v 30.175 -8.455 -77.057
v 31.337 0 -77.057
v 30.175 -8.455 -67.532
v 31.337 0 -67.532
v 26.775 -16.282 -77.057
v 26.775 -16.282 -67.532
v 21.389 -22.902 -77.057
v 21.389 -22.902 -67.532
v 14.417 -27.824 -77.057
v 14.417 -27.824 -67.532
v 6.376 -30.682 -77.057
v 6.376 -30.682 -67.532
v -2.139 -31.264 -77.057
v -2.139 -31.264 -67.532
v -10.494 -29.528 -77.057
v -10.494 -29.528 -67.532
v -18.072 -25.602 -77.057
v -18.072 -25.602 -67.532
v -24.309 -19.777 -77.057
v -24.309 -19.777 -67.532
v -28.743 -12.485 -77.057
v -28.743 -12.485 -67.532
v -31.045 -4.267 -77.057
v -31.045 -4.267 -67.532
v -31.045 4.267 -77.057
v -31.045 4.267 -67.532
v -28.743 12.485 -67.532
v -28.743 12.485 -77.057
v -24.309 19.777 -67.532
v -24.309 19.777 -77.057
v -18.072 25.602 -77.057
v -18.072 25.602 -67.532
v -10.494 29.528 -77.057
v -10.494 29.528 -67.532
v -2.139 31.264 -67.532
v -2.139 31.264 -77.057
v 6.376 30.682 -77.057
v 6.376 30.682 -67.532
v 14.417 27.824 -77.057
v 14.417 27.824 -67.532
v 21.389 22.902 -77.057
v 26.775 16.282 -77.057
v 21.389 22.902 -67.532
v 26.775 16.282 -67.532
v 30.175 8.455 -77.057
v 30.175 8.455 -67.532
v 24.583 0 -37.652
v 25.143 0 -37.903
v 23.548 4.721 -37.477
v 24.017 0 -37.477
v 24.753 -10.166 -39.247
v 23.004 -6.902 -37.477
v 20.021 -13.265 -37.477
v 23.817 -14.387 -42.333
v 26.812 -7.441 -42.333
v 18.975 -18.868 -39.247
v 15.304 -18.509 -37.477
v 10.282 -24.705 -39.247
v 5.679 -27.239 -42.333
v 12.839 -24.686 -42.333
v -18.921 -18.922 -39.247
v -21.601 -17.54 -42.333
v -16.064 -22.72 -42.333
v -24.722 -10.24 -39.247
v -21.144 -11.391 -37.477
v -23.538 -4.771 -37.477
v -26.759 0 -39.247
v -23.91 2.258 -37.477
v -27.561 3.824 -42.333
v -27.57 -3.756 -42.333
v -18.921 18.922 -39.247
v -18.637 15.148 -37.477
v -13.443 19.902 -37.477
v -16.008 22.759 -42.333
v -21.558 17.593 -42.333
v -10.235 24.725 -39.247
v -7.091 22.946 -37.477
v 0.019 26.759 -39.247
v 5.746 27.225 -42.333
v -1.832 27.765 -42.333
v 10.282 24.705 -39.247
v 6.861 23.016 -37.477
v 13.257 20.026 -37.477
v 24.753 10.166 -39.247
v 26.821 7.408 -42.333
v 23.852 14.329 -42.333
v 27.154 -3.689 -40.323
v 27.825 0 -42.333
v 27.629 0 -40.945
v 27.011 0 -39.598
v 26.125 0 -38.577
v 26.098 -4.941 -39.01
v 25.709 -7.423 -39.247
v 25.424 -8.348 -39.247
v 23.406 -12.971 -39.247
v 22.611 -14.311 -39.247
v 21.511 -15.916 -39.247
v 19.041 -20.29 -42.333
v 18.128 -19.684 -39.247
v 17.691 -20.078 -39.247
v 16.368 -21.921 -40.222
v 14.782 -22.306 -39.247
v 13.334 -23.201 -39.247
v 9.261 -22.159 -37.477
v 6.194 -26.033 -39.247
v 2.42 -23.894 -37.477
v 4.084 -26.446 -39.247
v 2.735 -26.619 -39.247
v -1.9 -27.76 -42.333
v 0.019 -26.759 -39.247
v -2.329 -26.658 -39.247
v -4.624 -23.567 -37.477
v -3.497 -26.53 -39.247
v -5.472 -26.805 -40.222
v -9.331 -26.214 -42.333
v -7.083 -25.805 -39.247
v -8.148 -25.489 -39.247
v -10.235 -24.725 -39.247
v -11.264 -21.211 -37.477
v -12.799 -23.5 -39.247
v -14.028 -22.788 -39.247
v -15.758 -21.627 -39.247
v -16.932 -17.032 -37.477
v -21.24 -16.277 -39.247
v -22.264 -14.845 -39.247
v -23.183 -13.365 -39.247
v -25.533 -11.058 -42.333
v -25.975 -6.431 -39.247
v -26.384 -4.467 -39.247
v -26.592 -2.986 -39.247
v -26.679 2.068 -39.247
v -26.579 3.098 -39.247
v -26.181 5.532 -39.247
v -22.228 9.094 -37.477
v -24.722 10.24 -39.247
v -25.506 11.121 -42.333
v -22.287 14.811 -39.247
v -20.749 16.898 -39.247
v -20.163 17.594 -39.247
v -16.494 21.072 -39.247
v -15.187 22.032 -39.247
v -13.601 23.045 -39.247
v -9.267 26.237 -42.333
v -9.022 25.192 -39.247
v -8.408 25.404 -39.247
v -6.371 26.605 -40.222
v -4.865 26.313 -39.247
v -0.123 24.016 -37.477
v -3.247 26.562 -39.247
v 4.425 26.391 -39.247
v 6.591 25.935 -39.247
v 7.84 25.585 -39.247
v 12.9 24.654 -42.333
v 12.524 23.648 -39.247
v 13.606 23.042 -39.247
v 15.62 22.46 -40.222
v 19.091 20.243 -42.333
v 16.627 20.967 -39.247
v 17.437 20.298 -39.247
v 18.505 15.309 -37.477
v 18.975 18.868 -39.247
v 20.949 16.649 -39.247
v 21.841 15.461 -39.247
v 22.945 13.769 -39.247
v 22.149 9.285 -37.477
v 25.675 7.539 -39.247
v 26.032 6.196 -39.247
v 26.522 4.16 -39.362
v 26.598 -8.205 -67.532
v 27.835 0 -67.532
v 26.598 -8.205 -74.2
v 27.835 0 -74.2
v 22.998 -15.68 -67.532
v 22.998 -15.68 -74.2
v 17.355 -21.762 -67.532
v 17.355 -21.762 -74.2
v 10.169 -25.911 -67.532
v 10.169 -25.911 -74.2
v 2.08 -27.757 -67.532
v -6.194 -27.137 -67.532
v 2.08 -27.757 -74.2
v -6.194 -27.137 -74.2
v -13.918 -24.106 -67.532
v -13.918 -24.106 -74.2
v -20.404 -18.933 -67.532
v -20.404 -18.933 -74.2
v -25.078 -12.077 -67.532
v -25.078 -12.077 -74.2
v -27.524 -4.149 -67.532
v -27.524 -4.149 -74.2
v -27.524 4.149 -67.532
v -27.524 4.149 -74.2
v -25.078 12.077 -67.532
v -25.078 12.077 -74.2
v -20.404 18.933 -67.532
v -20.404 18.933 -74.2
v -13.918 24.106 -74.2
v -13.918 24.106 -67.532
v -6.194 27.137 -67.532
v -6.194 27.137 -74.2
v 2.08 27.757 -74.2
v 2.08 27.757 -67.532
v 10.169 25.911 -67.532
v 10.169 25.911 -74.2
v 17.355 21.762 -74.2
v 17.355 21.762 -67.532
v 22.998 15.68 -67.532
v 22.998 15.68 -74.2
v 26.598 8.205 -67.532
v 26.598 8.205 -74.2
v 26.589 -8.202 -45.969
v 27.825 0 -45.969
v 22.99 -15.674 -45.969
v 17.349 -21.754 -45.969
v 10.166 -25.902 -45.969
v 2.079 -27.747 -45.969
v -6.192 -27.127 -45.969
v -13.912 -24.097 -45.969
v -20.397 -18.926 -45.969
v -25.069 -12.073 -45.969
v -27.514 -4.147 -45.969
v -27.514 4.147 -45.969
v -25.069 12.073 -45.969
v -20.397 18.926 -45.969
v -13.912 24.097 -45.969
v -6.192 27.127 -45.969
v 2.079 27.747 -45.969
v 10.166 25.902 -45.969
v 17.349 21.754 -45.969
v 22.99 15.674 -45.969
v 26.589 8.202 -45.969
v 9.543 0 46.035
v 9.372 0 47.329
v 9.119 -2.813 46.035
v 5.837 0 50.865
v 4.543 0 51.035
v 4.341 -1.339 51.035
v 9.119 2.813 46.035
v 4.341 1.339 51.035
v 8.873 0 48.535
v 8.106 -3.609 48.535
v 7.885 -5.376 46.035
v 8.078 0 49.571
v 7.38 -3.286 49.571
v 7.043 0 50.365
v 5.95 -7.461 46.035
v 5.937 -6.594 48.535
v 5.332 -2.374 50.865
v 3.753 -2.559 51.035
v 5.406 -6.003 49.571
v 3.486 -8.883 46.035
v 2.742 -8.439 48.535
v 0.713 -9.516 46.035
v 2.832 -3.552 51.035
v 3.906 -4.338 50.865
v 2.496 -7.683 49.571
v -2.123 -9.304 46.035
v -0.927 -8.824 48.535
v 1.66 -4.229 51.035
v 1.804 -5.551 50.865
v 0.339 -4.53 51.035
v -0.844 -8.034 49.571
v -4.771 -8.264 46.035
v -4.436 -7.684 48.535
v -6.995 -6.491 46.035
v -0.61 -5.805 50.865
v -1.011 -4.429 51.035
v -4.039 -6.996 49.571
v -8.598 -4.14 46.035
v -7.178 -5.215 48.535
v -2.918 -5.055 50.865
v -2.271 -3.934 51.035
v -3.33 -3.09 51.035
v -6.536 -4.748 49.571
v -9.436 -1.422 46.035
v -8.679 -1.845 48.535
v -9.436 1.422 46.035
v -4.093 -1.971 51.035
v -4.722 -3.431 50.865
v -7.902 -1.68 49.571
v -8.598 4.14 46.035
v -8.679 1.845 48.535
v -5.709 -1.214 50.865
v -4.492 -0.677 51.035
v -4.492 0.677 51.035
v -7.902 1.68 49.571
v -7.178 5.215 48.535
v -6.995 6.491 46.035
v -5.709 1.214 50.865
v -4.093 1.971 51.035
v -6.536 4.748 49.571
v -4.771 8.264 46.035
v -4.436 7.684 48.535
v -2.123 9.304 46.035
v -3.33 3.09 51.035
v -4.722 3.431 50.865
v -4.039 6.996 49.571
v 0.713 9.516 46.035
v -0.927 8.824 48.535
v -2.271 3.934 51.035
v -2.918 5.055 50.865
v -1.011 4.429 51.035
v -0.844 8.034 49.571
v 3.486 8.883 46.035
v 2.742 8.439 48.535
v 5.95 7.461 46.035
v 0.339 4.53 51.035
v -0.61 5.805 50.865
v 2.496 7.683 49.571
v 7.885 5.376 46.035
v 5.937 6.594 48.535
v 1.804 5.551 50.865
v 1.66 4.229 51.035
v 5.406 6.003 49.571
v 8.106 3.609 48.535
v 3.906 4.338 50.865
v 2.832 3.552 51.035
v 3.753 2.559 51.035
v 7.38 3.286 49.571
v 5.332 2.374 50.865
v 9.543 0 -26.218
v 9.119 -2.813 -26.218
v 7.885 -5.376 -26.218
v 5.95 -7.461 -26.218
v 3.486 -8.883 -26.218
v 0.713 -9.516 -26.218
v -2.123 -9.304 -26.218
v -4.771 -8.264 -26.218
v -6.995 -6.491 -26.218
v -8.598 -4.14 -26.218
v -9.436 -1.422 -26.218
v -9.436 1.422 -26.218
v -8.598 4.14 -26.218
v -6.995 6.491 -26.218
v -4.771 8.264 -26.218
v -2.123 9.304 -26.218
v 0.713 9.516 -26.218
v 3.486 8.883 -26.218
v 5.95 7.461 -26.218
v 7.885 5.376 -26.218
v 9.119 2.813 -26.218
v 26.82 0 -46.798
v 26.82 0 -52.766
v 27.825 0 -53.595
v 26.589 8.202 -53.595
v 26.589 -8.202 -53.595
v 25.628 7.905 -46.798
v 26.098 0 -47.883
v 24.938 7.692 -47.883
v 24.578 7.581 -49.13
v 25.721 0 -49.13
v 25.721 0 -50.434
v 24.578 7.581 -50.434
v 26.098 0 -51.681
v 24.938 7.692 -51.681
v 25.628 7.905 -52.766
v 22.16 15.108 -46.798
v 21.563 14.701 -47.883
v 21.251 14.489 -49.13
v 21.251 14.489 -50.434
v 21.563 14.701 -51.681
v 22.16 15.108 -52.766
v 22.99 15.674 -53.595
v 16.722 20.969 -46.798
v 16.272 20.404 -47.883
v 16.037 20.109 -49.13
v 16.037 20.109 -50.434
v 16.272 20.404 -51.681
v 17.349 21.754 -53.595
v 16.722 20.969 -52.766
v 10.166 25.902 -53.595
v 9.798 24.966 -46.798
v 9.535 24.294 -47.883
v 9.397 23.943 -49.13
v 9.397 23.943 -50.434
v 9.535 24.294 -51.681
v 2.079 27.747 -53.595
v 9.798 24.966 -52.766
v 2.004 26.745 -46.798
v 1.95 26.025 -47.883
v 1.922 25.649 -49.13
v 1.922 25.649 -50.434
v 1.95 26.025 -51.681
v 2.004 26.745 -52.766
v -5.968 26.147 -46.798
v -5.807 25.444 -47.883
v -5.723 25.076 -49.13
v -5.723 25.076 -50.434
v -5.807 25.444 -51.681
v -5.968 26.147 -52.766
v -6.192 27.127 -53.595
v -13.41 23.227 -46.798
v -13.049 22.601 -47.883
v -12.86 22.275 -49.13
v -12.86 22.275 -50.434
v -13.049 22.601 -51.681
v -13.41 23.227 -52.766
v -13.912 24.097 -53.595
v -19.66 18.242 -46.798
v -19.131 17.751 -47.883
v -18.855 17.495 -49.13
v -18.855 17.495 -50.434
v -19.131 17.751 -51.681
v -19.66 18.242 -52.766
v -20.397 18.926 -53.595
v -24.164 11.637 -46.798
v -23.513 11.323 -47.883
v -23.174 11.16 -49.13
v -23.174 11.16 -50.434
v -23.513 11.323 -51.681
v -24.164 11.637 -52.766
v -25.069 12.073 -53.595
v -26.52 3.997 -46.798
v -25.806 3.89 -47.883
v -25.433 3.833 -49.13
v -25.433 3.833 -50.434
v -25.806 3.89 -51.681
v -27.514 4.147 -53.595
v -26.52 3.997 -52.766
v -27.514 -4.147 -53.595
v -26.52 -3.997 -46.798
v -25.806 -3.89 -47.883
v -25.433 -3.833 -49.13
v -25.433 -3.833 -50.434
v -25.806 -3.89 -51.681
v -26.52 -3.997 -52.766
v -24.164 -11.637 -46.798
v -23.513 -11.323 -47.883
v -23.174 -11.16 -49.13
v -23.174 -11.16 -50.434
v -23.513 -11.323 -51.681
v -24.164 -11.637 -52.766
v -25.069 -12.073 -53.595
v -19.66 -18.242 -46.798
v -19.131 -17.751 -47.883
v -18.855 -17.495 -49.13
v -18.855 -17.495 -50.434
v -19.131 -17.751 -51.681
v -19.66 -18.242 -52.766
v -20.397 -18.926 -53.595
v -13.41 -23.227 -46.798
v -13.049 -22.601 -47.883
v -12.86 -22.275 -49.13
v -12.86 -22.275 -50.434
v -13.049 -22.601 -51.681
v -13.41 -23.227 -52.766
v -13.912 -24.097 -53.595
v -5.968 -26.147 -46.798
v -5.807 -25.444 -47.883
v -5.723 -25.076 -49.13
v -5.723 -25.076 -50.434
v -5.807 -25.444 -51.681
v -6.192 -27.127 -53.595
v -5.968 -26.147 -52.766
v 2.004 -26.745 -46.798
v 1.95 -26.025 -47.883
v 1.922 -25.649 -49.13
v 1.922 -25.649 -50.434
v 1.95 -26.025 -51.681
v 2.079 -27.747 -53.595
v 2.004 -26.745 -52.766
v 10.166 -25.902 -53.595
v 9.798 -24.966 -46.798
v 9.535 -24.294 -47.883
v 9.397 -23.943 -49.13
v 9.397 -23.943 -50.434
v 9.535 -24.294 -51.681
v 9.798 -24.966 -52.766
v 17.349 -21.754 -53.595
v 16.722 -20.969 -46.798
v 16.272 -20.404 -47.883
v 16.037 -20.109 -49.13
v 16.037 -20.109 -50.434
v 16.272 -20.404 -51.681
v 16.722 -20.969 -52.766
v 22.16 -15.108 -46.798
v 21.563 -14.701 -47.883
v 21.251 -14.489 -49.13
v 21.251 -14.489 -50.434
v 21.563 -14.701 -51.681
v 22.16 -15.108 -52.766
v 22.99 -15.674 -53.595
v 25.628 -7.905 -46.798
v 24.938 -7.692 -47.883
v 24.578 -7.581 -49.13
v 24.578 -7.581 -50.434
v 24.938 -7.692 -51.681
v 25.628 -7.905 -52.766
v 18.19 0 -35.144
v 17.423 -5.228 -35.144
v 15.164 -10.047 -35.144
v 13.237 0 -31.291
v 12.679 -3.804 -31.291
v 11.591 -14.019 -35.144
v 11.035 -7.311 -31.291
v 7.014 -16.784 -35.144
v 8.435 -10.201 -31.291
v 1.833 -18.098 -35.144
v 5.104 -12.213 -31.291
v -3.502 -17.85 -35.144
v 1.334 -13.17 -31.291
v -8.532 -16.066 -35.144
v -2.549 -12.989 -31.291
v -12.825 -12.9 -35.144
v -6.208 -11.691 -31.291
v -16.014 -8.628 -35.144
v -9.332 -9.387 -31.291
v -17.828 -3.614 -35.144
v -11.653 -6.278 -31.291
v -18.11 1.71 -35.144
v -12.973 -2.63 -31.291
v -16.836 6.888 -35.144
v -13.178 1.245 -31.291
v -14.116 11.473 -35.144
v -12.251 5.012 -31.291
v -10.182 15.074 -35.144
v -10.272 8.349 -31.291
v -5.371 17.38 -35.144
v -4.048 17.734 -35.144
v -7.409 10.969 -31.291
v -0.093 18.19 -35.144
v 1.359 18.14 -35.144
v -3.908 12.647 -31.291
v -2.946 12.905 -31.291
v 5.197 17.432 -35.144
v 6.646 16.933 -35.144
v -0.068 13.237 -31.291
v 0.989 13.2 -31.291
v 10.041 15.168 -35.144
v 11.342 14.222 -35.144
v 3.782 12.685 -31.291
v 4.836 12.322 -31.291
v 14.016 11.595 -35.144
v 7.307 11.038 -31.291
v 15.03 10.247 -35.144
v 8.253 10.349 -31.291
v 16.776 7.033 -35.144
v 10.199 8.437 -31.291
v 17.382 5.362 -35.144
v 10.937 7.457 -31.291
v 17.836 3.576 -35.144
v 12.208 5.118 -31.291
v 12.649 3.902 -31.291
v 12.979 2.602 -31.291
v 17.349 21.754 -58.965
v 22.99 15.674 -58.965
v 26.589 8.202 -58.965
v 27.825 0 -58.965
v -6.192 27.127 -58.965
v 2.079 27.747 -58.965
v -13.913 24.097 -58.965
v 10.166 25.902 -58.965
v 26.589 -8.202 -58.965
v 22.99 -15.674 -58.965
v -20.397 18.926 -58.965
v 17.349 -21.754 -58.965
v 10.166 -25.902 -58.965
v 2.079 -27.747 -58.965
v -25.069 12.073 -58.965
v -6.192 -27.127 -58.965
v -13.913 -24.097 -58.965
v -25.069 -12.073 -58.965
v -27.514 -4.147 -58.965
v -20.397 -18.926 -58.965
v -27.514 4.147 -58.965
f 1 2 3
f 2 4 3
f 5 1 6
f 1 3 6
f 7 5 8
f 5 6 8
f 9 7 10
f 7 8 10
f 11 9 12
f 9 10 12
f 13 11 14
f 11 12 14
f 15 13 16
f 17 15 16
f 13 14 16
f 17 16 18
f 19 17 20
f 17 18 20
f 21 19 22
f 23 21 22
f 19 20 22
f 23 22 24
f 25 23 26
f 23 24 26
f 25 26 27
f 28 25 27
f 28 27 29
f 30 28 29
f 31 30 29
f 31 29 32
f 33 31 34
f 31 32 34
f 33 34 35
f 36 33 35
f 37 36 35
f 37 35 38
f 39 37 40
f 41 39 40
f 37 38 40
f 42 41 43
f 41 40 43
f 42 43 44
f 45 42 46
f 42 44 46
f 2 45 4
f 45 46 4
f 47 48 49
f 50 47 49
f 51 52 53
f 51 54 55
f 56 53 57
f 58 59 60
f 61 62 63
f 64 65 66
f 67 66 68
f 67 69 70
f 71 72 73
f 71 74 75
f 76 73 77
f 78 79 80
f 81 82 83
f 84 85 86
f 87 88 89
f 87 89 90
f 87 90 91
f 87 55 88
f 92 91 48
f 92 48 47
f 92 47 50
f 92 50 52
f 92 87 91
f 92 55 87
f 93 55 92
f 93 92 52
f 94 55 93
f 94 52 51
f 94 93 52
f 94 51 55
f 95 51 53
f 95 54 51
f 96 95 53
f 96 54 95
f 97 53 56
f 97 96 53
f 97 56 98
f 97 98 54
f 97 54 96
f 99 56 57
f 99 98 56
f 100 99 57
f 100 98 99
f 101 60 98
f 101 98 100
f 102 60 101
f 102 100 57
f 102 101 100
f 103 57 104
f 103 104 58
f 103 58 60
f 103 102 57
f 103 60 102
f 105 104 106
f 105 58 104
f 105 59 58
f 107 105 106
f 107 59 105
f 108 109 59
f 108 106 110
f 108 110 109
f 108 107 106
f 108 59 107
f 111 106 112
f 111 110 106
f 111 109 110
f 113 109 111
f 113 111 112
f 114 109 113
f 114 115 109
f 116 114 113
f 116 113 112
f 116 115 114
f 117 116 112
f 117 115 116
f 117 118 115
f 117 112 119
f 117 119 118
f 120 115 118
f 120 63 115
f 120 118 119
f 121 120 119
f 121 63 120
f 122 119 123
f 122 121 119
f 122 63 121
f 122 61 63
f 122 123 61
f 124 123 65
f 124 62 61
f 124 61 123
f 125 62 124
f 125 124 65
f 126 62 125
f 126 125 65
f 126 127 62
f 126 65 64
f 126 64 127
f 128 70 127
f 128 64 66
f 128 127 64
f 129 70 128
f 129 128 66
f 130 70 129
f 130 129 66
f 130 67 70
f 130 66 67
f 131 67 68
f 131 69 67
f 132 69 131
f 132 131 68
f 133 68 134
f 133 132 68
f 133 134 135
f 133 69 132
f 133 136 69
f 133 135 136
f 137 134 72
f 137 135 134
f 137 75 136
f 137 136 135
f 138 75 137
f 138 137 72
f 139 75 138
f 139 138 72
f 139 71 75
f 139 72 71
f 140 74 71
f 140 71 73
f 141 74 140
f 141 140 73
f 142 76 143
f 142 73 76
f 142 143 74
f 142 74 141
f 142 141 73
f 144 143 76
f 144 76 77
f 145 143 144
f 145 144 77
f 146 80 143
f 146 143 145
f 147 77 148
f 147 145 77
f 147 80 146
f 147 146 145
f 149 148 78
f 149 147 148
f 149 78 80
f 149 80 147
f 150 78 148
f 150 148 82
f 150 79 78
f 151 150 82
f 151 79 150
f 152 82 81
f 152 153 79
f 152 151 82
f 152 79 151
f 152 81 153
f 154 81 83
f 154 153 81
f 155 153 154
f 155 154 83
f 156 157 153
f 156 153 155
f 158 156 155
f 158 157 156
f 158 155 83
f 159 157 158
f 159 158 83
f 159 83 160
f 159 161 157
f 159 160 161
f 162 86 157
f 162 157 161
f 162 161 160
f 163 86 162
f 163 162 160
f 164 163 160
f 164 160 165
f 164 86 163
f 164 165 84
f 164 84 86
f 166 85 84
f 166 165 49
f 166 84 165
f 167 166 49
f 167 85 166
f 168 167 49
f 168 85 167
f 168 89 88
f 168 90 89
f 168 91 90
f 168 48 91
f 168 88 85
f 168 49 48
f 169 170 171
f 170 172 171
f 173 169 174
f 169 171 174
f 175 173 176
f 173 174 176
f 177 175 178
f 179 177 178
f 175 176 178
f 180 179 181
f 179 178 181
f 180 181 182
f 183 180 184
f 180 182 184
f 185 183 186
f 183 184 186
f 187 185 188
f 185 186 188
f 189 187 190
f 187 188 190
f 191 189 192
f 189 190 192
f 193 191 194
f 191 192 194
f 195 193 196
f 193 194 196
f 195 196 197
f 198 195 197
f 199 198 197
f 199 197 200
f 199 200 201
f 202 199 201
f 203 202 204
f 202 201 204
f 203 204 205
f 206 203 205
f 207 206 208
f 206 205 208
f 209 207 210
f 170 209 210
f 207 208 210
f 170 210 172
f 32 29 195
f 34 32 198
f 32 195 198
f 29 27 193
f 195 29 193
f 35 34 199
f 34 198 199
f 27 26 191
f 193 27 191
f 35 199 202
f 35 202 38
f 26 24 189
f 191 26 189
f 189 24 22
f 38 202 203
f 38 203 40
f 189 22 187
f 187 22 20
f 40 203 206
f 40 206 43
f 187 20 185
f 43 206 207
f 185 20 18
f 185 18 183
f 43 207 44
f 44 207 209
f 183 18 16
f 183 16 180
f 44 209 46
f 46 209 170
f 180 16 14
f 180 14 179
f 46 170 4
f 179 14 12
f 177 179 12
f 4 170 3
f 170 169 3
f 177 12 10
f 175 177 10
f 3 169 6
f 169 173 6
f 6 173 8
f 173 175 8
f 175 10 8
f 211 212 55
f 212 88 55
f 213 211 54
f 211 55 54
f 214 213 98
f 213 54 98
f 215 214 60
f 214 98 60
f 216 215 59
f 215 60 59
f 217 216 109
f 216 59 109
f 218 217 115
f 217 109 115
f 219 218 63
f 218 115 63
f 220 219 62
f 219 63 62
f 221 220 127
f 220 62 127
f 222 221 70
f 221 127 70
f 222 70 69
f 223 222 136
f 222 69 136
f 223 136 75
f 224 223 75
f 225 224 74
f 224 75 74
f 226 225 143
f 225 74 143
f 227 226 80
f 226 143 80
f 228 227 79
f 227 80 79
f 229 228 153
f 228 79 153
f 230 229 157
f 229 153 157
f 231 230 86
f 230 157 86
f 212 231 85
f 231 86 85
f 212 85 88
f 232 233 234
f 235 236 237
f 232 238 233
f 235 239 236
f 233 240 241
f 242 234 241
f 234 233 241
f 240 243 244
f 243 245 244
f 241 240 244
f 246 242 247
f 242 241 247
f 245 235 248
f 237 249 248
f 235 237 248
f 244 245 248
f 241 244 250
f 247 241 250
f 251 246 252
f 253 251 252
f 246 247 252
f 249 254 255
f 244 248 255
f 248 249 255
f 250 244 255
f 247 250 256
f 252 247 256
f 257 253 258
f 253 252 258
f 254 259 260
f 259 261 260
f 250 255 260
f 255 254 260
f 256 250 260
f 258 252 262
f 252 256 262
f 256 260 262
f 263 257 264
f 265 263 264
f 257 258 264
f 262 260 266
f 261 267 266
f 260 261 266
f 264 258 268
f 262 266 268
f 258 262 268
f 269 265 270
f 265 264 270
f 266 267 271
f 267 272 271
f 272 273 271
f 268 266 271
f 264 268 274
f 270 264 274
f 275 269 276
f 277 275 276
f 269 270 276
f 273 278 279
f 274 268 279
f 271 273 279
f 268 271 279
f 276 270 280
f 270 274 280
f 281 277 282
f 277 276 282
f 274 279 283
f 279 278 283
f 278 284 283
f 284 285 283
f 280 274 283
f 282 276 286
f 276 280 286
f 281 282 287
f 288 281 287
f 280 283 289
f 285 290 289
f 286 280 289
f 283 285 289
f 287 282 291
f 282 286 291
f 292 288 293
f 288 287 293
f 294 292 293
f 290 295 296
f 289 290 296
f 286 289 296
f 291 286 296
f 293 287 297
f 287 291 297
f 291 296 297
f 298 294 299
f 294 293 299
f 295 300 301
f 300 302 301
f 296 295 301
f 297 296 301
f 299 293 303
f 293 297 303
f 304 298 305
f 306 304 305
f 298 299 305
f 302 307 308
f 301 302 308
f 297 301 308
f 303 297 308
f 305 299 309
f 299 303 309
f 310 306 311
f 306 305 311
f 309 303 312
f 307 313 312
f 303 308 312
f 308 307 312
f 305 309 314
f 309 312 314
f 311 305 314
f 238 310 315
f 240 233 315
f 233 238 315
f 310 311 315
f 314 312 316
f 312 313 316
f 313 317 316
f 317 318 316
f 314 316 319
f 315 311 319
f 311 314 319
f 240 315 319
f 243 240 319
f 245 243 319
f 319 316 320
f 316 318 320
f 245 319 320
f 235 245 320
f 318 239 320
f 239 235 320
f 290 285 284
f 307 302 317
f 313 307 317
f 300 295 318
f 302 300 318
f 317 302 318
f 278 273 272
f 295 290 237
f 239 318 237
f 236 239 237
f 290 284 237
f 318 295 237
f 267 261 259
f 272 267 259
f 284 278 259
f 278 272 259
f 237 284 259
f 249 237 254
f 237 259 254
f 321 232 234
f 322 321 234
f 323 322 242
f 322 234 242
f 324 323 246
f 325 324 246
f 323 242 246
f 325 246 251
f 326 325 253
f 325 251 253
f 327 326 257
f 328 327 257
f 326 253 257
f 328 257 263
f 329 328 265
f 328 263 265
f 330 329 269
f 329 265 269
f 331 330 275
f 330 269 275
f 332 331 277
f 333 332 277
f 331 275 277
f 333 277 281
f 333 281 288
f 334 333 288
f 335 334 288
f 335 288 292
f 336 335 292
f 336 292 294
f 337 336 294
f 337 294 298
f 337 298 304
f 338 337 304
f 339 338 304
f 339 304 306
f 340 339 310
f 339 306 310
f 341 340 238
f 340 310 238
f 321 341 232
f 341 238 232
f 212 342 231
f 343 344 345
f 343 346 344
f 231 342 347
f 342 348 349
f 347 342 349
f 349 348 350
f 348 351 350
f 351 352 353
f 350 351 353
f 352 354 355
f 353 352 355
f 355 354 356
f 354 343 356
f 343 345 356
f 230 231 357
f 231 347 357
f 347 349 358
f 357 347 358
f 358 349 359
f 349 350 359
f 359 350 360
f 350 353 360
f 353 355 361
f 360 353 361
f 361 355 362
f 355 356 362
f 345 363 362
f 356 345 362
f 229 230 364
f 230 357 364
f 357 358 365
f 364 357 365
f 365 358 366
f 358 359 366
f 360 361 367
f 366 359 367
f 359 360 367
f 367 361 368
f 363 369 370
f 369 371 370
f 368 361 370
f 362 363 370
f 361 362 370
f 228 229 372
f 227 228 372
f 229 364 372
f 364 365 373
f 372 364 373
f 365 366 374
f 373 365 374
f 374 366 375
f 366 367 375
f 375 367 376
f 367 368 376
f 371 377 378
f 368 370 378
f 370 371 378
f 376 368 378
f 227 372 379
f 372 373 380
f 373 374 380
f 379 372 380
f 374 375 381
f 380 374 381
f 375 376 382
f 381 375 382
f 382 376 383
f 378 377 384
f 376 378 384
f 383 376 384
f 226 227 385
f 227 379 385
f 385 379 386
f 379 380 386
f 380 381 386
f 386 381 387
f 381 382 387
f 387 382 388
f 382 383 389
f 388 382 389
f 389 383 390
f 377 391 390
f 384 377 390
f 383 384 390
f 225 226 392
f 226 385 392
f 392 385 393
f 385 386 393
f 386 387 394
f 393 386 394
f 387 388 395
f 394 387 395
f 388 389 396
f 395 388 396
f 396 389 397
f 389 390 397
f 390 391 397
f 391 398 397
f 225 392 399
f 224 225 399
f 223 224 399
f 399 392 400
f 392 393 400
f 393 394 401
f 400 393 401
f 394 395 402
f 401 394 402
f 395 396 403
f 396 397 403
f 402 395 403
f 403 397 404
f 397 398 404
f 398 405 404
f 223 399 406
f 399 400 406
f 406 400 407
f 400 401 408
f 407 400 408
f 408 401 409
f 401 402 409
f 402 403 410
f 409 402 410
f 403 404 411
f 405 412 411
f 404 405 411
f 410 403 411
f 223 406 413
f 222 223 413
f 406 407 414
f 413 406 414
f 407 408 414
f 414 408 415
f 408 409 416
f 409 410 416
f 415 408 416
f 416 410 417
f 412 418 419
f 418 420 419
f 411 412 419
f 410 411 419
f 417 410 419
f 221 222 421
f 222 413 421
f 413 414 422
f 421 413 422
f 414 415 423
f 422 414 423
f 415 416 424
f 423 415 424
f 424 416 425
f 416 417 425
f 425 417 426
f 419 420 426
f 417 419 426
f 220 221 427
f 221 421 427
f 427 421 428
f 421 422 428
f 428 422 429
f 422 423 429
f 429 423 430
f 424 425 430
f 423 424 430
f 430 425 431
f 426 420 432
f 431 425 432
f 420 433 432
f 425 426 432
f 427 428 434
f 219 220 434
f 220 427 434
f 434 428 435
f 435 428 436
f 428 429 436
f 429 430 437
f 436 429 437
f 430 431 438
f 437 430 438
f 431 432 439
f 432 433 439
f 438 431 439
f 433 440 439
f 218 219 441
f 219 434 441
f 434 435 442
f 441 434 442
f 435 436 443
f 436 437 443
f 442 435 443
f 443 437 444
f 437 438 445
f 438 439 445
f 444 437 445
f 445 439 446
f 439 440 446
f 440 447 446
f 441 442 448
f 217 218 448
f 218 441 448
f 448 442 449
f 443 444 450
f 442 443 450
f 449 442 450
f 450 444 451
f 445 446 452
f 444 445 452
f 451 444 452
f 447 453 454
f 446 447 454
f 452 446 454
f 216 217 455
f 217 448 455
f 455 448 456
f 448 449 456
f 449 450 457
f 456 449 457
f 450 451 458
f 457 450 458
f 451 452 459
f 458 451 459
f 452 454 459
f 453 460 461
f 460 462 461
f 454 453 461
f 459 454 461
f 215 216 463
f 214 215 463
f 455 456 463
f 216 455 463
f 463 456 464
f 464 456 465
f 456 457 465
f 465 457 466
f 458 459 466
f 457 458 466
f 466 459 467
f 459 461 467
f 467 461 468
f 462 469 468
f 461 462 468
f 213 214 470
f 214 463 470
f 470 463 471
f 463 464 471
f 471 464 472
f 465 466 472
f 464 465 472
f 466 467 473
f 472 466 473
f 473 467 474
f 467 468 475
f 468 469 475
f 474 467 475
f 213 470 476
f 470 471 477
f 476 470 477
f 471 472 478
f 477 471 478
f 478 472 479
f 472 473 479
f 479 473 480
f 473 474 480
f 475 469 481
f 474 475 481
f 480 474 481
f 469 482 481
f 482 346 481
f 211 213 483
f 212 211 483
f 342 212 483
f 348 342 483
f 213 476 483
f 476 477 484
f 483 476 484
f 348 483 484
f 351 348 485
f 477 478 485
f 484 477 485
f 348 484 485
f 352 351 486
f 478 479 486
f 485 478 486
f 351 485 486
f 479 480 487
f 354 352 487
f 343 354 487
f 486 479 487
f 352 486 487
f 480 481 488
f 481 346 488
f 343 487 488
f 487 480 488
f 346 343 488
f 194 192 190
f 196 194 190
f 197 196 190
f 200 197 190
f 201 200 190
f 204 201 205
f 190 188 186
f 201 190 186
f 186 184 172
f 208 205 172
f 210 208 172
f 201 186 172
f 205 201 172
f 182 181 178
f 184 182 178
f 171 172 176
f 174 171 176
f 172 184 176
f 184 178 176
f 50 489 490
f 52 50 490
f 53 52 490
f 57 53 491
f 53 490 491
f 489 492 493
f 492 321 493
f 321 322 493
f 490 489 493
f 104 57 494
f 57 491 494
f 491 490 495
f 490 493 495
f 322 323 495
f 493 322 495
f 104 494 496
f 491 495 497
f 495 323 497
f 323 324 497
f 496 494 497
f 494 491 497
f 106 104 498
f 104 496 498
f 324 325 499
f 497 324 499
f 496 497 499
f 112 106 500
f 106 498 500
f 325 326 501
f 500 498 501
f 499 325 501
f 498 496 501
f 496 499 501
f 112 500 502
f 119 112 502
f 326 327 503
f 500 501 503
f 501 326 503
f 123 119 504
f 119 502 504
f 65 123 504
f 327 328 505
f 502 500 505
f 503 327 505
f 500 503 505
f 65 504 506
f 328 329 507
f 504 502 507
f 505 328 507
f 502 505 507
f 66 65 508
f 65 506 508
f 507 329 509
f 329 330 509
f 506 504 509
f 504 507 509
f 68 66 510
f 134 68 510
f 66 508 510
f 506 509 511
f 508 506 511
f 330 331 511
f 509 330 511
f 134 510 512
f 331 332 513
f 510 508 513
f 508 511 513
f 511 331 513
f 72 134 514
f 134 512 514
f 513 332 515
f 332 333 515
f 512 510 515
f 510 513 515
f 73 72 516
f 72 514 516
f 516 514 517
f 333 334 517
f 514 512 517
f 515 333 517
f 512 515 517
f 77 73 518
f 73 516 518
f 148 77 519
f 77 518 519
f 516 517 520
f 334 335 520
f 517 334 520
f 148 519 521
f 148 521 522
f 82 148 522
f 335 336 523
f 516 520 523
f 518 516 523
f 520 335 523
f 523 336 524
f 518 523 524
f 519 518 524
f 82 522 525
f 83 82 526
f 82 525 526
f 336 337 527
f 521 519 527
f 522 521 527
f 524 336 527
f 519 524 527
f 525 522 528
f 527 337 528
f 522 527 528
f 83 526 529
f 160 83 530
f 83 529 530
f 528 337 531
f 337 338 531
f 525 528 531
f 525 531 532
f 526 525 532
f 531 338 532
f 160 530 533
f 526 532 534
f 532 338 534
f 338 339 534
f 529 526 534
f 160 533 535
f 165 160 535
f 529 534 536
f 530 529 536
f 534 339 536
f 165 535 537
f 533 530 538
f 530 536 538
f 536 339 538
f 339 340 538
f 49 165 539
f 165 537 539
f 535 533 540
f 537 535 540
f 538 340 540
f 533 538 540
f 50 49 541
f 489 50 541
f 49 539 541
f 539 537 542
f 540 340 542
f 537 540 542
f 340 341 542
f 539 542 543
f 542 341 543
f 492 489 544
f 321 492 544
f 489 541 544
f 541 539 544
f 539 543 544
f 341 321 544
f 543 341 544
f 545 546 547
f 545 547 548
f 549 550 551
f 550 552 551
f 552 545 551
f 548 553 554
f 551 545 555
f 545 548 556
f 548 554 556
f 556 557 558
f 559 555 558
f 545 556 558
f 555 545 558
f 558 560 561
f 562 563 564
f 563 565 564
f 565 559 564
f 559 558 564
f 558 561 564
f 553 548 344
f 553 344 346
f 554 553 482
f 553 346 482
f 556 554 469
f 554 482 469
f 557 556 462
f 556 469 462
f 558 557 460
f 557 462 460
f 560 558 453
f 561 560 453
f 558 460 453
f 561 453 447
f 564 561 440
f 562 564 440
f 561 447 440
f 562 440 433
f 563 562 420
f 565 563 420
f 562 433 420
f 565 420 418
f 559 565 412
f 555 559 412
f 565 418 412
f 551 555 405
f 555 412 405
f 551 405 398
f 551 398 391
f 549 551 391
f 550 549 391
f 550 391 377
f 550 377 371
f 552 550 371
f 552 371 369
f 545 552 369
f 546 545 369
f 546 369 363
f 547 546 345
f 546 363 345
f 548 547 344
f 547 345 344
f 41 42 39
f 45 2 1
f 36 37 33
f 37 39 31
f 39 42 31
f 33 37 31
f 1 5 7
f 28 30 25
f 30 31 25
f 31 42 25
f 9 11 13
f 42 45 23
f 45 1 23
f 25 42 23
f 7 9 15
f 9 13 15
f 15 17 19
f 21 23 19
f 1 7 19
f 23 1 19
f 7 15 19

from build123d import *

# Parameters (mm, degrees)
F3_R = 5
F4_R = 5
F2_R = 4.453518


with BuildPart() as f1:
    # F0 (on Front) → F1 (revolve)
    with BuildSketch(Plane.XZ):
        with BuildLine():
            Line((0, 51.035111), (0, -58.964889))
            Line((0, -58.964889), (27.825, -58.964889))
            Line((27.825, -58.964889), (27.825, -38.071028))
            ThreePointArc((27.825, -38.071028), (17.150476, -34.509568), (9.54287, -26.217778))
            Line((9.54287, -26.217778), (9.54287, 51.035111))
            Line((9.54287, 51.035111), (0, 51.035111))
        make_face()
        Polygon((27.835, -74.199751), (0, -74.199751), (0, -77.05725), (31.337254, -77.05725), (31.337254, -67.532249), (27.835, -67.532249), align=None)
    revolve(axis=Axis((0, 0, -3.964889), (0, 0, -1)))

    # F3
    f3_edges = [f1.edges().sort_by_distance(p)[0] for p in [
        (-27.825, 0, -38.071028),
    ]]
    fillet(f3_edges, radius=F3_R)

    # F4
    f4_edges = [f1.edges().sort_by_distance(p)[0] for p in [
        (-9.54287, 0, 51.035111),
    ]]
    fillet(f4_edges, radius=F4_R)

    # F2 (on Front) → F5 (revolve, cut)
    with BuildSketch(Plane.XZ):
        with Locations((30.126341, -49.781982)):
            Circle(F2_R)
    revolve(axis=Axis((0, 0, -58.964889), (0, 0, 1)), mode=Mode.SUBTRACT)


solid = f1.part
